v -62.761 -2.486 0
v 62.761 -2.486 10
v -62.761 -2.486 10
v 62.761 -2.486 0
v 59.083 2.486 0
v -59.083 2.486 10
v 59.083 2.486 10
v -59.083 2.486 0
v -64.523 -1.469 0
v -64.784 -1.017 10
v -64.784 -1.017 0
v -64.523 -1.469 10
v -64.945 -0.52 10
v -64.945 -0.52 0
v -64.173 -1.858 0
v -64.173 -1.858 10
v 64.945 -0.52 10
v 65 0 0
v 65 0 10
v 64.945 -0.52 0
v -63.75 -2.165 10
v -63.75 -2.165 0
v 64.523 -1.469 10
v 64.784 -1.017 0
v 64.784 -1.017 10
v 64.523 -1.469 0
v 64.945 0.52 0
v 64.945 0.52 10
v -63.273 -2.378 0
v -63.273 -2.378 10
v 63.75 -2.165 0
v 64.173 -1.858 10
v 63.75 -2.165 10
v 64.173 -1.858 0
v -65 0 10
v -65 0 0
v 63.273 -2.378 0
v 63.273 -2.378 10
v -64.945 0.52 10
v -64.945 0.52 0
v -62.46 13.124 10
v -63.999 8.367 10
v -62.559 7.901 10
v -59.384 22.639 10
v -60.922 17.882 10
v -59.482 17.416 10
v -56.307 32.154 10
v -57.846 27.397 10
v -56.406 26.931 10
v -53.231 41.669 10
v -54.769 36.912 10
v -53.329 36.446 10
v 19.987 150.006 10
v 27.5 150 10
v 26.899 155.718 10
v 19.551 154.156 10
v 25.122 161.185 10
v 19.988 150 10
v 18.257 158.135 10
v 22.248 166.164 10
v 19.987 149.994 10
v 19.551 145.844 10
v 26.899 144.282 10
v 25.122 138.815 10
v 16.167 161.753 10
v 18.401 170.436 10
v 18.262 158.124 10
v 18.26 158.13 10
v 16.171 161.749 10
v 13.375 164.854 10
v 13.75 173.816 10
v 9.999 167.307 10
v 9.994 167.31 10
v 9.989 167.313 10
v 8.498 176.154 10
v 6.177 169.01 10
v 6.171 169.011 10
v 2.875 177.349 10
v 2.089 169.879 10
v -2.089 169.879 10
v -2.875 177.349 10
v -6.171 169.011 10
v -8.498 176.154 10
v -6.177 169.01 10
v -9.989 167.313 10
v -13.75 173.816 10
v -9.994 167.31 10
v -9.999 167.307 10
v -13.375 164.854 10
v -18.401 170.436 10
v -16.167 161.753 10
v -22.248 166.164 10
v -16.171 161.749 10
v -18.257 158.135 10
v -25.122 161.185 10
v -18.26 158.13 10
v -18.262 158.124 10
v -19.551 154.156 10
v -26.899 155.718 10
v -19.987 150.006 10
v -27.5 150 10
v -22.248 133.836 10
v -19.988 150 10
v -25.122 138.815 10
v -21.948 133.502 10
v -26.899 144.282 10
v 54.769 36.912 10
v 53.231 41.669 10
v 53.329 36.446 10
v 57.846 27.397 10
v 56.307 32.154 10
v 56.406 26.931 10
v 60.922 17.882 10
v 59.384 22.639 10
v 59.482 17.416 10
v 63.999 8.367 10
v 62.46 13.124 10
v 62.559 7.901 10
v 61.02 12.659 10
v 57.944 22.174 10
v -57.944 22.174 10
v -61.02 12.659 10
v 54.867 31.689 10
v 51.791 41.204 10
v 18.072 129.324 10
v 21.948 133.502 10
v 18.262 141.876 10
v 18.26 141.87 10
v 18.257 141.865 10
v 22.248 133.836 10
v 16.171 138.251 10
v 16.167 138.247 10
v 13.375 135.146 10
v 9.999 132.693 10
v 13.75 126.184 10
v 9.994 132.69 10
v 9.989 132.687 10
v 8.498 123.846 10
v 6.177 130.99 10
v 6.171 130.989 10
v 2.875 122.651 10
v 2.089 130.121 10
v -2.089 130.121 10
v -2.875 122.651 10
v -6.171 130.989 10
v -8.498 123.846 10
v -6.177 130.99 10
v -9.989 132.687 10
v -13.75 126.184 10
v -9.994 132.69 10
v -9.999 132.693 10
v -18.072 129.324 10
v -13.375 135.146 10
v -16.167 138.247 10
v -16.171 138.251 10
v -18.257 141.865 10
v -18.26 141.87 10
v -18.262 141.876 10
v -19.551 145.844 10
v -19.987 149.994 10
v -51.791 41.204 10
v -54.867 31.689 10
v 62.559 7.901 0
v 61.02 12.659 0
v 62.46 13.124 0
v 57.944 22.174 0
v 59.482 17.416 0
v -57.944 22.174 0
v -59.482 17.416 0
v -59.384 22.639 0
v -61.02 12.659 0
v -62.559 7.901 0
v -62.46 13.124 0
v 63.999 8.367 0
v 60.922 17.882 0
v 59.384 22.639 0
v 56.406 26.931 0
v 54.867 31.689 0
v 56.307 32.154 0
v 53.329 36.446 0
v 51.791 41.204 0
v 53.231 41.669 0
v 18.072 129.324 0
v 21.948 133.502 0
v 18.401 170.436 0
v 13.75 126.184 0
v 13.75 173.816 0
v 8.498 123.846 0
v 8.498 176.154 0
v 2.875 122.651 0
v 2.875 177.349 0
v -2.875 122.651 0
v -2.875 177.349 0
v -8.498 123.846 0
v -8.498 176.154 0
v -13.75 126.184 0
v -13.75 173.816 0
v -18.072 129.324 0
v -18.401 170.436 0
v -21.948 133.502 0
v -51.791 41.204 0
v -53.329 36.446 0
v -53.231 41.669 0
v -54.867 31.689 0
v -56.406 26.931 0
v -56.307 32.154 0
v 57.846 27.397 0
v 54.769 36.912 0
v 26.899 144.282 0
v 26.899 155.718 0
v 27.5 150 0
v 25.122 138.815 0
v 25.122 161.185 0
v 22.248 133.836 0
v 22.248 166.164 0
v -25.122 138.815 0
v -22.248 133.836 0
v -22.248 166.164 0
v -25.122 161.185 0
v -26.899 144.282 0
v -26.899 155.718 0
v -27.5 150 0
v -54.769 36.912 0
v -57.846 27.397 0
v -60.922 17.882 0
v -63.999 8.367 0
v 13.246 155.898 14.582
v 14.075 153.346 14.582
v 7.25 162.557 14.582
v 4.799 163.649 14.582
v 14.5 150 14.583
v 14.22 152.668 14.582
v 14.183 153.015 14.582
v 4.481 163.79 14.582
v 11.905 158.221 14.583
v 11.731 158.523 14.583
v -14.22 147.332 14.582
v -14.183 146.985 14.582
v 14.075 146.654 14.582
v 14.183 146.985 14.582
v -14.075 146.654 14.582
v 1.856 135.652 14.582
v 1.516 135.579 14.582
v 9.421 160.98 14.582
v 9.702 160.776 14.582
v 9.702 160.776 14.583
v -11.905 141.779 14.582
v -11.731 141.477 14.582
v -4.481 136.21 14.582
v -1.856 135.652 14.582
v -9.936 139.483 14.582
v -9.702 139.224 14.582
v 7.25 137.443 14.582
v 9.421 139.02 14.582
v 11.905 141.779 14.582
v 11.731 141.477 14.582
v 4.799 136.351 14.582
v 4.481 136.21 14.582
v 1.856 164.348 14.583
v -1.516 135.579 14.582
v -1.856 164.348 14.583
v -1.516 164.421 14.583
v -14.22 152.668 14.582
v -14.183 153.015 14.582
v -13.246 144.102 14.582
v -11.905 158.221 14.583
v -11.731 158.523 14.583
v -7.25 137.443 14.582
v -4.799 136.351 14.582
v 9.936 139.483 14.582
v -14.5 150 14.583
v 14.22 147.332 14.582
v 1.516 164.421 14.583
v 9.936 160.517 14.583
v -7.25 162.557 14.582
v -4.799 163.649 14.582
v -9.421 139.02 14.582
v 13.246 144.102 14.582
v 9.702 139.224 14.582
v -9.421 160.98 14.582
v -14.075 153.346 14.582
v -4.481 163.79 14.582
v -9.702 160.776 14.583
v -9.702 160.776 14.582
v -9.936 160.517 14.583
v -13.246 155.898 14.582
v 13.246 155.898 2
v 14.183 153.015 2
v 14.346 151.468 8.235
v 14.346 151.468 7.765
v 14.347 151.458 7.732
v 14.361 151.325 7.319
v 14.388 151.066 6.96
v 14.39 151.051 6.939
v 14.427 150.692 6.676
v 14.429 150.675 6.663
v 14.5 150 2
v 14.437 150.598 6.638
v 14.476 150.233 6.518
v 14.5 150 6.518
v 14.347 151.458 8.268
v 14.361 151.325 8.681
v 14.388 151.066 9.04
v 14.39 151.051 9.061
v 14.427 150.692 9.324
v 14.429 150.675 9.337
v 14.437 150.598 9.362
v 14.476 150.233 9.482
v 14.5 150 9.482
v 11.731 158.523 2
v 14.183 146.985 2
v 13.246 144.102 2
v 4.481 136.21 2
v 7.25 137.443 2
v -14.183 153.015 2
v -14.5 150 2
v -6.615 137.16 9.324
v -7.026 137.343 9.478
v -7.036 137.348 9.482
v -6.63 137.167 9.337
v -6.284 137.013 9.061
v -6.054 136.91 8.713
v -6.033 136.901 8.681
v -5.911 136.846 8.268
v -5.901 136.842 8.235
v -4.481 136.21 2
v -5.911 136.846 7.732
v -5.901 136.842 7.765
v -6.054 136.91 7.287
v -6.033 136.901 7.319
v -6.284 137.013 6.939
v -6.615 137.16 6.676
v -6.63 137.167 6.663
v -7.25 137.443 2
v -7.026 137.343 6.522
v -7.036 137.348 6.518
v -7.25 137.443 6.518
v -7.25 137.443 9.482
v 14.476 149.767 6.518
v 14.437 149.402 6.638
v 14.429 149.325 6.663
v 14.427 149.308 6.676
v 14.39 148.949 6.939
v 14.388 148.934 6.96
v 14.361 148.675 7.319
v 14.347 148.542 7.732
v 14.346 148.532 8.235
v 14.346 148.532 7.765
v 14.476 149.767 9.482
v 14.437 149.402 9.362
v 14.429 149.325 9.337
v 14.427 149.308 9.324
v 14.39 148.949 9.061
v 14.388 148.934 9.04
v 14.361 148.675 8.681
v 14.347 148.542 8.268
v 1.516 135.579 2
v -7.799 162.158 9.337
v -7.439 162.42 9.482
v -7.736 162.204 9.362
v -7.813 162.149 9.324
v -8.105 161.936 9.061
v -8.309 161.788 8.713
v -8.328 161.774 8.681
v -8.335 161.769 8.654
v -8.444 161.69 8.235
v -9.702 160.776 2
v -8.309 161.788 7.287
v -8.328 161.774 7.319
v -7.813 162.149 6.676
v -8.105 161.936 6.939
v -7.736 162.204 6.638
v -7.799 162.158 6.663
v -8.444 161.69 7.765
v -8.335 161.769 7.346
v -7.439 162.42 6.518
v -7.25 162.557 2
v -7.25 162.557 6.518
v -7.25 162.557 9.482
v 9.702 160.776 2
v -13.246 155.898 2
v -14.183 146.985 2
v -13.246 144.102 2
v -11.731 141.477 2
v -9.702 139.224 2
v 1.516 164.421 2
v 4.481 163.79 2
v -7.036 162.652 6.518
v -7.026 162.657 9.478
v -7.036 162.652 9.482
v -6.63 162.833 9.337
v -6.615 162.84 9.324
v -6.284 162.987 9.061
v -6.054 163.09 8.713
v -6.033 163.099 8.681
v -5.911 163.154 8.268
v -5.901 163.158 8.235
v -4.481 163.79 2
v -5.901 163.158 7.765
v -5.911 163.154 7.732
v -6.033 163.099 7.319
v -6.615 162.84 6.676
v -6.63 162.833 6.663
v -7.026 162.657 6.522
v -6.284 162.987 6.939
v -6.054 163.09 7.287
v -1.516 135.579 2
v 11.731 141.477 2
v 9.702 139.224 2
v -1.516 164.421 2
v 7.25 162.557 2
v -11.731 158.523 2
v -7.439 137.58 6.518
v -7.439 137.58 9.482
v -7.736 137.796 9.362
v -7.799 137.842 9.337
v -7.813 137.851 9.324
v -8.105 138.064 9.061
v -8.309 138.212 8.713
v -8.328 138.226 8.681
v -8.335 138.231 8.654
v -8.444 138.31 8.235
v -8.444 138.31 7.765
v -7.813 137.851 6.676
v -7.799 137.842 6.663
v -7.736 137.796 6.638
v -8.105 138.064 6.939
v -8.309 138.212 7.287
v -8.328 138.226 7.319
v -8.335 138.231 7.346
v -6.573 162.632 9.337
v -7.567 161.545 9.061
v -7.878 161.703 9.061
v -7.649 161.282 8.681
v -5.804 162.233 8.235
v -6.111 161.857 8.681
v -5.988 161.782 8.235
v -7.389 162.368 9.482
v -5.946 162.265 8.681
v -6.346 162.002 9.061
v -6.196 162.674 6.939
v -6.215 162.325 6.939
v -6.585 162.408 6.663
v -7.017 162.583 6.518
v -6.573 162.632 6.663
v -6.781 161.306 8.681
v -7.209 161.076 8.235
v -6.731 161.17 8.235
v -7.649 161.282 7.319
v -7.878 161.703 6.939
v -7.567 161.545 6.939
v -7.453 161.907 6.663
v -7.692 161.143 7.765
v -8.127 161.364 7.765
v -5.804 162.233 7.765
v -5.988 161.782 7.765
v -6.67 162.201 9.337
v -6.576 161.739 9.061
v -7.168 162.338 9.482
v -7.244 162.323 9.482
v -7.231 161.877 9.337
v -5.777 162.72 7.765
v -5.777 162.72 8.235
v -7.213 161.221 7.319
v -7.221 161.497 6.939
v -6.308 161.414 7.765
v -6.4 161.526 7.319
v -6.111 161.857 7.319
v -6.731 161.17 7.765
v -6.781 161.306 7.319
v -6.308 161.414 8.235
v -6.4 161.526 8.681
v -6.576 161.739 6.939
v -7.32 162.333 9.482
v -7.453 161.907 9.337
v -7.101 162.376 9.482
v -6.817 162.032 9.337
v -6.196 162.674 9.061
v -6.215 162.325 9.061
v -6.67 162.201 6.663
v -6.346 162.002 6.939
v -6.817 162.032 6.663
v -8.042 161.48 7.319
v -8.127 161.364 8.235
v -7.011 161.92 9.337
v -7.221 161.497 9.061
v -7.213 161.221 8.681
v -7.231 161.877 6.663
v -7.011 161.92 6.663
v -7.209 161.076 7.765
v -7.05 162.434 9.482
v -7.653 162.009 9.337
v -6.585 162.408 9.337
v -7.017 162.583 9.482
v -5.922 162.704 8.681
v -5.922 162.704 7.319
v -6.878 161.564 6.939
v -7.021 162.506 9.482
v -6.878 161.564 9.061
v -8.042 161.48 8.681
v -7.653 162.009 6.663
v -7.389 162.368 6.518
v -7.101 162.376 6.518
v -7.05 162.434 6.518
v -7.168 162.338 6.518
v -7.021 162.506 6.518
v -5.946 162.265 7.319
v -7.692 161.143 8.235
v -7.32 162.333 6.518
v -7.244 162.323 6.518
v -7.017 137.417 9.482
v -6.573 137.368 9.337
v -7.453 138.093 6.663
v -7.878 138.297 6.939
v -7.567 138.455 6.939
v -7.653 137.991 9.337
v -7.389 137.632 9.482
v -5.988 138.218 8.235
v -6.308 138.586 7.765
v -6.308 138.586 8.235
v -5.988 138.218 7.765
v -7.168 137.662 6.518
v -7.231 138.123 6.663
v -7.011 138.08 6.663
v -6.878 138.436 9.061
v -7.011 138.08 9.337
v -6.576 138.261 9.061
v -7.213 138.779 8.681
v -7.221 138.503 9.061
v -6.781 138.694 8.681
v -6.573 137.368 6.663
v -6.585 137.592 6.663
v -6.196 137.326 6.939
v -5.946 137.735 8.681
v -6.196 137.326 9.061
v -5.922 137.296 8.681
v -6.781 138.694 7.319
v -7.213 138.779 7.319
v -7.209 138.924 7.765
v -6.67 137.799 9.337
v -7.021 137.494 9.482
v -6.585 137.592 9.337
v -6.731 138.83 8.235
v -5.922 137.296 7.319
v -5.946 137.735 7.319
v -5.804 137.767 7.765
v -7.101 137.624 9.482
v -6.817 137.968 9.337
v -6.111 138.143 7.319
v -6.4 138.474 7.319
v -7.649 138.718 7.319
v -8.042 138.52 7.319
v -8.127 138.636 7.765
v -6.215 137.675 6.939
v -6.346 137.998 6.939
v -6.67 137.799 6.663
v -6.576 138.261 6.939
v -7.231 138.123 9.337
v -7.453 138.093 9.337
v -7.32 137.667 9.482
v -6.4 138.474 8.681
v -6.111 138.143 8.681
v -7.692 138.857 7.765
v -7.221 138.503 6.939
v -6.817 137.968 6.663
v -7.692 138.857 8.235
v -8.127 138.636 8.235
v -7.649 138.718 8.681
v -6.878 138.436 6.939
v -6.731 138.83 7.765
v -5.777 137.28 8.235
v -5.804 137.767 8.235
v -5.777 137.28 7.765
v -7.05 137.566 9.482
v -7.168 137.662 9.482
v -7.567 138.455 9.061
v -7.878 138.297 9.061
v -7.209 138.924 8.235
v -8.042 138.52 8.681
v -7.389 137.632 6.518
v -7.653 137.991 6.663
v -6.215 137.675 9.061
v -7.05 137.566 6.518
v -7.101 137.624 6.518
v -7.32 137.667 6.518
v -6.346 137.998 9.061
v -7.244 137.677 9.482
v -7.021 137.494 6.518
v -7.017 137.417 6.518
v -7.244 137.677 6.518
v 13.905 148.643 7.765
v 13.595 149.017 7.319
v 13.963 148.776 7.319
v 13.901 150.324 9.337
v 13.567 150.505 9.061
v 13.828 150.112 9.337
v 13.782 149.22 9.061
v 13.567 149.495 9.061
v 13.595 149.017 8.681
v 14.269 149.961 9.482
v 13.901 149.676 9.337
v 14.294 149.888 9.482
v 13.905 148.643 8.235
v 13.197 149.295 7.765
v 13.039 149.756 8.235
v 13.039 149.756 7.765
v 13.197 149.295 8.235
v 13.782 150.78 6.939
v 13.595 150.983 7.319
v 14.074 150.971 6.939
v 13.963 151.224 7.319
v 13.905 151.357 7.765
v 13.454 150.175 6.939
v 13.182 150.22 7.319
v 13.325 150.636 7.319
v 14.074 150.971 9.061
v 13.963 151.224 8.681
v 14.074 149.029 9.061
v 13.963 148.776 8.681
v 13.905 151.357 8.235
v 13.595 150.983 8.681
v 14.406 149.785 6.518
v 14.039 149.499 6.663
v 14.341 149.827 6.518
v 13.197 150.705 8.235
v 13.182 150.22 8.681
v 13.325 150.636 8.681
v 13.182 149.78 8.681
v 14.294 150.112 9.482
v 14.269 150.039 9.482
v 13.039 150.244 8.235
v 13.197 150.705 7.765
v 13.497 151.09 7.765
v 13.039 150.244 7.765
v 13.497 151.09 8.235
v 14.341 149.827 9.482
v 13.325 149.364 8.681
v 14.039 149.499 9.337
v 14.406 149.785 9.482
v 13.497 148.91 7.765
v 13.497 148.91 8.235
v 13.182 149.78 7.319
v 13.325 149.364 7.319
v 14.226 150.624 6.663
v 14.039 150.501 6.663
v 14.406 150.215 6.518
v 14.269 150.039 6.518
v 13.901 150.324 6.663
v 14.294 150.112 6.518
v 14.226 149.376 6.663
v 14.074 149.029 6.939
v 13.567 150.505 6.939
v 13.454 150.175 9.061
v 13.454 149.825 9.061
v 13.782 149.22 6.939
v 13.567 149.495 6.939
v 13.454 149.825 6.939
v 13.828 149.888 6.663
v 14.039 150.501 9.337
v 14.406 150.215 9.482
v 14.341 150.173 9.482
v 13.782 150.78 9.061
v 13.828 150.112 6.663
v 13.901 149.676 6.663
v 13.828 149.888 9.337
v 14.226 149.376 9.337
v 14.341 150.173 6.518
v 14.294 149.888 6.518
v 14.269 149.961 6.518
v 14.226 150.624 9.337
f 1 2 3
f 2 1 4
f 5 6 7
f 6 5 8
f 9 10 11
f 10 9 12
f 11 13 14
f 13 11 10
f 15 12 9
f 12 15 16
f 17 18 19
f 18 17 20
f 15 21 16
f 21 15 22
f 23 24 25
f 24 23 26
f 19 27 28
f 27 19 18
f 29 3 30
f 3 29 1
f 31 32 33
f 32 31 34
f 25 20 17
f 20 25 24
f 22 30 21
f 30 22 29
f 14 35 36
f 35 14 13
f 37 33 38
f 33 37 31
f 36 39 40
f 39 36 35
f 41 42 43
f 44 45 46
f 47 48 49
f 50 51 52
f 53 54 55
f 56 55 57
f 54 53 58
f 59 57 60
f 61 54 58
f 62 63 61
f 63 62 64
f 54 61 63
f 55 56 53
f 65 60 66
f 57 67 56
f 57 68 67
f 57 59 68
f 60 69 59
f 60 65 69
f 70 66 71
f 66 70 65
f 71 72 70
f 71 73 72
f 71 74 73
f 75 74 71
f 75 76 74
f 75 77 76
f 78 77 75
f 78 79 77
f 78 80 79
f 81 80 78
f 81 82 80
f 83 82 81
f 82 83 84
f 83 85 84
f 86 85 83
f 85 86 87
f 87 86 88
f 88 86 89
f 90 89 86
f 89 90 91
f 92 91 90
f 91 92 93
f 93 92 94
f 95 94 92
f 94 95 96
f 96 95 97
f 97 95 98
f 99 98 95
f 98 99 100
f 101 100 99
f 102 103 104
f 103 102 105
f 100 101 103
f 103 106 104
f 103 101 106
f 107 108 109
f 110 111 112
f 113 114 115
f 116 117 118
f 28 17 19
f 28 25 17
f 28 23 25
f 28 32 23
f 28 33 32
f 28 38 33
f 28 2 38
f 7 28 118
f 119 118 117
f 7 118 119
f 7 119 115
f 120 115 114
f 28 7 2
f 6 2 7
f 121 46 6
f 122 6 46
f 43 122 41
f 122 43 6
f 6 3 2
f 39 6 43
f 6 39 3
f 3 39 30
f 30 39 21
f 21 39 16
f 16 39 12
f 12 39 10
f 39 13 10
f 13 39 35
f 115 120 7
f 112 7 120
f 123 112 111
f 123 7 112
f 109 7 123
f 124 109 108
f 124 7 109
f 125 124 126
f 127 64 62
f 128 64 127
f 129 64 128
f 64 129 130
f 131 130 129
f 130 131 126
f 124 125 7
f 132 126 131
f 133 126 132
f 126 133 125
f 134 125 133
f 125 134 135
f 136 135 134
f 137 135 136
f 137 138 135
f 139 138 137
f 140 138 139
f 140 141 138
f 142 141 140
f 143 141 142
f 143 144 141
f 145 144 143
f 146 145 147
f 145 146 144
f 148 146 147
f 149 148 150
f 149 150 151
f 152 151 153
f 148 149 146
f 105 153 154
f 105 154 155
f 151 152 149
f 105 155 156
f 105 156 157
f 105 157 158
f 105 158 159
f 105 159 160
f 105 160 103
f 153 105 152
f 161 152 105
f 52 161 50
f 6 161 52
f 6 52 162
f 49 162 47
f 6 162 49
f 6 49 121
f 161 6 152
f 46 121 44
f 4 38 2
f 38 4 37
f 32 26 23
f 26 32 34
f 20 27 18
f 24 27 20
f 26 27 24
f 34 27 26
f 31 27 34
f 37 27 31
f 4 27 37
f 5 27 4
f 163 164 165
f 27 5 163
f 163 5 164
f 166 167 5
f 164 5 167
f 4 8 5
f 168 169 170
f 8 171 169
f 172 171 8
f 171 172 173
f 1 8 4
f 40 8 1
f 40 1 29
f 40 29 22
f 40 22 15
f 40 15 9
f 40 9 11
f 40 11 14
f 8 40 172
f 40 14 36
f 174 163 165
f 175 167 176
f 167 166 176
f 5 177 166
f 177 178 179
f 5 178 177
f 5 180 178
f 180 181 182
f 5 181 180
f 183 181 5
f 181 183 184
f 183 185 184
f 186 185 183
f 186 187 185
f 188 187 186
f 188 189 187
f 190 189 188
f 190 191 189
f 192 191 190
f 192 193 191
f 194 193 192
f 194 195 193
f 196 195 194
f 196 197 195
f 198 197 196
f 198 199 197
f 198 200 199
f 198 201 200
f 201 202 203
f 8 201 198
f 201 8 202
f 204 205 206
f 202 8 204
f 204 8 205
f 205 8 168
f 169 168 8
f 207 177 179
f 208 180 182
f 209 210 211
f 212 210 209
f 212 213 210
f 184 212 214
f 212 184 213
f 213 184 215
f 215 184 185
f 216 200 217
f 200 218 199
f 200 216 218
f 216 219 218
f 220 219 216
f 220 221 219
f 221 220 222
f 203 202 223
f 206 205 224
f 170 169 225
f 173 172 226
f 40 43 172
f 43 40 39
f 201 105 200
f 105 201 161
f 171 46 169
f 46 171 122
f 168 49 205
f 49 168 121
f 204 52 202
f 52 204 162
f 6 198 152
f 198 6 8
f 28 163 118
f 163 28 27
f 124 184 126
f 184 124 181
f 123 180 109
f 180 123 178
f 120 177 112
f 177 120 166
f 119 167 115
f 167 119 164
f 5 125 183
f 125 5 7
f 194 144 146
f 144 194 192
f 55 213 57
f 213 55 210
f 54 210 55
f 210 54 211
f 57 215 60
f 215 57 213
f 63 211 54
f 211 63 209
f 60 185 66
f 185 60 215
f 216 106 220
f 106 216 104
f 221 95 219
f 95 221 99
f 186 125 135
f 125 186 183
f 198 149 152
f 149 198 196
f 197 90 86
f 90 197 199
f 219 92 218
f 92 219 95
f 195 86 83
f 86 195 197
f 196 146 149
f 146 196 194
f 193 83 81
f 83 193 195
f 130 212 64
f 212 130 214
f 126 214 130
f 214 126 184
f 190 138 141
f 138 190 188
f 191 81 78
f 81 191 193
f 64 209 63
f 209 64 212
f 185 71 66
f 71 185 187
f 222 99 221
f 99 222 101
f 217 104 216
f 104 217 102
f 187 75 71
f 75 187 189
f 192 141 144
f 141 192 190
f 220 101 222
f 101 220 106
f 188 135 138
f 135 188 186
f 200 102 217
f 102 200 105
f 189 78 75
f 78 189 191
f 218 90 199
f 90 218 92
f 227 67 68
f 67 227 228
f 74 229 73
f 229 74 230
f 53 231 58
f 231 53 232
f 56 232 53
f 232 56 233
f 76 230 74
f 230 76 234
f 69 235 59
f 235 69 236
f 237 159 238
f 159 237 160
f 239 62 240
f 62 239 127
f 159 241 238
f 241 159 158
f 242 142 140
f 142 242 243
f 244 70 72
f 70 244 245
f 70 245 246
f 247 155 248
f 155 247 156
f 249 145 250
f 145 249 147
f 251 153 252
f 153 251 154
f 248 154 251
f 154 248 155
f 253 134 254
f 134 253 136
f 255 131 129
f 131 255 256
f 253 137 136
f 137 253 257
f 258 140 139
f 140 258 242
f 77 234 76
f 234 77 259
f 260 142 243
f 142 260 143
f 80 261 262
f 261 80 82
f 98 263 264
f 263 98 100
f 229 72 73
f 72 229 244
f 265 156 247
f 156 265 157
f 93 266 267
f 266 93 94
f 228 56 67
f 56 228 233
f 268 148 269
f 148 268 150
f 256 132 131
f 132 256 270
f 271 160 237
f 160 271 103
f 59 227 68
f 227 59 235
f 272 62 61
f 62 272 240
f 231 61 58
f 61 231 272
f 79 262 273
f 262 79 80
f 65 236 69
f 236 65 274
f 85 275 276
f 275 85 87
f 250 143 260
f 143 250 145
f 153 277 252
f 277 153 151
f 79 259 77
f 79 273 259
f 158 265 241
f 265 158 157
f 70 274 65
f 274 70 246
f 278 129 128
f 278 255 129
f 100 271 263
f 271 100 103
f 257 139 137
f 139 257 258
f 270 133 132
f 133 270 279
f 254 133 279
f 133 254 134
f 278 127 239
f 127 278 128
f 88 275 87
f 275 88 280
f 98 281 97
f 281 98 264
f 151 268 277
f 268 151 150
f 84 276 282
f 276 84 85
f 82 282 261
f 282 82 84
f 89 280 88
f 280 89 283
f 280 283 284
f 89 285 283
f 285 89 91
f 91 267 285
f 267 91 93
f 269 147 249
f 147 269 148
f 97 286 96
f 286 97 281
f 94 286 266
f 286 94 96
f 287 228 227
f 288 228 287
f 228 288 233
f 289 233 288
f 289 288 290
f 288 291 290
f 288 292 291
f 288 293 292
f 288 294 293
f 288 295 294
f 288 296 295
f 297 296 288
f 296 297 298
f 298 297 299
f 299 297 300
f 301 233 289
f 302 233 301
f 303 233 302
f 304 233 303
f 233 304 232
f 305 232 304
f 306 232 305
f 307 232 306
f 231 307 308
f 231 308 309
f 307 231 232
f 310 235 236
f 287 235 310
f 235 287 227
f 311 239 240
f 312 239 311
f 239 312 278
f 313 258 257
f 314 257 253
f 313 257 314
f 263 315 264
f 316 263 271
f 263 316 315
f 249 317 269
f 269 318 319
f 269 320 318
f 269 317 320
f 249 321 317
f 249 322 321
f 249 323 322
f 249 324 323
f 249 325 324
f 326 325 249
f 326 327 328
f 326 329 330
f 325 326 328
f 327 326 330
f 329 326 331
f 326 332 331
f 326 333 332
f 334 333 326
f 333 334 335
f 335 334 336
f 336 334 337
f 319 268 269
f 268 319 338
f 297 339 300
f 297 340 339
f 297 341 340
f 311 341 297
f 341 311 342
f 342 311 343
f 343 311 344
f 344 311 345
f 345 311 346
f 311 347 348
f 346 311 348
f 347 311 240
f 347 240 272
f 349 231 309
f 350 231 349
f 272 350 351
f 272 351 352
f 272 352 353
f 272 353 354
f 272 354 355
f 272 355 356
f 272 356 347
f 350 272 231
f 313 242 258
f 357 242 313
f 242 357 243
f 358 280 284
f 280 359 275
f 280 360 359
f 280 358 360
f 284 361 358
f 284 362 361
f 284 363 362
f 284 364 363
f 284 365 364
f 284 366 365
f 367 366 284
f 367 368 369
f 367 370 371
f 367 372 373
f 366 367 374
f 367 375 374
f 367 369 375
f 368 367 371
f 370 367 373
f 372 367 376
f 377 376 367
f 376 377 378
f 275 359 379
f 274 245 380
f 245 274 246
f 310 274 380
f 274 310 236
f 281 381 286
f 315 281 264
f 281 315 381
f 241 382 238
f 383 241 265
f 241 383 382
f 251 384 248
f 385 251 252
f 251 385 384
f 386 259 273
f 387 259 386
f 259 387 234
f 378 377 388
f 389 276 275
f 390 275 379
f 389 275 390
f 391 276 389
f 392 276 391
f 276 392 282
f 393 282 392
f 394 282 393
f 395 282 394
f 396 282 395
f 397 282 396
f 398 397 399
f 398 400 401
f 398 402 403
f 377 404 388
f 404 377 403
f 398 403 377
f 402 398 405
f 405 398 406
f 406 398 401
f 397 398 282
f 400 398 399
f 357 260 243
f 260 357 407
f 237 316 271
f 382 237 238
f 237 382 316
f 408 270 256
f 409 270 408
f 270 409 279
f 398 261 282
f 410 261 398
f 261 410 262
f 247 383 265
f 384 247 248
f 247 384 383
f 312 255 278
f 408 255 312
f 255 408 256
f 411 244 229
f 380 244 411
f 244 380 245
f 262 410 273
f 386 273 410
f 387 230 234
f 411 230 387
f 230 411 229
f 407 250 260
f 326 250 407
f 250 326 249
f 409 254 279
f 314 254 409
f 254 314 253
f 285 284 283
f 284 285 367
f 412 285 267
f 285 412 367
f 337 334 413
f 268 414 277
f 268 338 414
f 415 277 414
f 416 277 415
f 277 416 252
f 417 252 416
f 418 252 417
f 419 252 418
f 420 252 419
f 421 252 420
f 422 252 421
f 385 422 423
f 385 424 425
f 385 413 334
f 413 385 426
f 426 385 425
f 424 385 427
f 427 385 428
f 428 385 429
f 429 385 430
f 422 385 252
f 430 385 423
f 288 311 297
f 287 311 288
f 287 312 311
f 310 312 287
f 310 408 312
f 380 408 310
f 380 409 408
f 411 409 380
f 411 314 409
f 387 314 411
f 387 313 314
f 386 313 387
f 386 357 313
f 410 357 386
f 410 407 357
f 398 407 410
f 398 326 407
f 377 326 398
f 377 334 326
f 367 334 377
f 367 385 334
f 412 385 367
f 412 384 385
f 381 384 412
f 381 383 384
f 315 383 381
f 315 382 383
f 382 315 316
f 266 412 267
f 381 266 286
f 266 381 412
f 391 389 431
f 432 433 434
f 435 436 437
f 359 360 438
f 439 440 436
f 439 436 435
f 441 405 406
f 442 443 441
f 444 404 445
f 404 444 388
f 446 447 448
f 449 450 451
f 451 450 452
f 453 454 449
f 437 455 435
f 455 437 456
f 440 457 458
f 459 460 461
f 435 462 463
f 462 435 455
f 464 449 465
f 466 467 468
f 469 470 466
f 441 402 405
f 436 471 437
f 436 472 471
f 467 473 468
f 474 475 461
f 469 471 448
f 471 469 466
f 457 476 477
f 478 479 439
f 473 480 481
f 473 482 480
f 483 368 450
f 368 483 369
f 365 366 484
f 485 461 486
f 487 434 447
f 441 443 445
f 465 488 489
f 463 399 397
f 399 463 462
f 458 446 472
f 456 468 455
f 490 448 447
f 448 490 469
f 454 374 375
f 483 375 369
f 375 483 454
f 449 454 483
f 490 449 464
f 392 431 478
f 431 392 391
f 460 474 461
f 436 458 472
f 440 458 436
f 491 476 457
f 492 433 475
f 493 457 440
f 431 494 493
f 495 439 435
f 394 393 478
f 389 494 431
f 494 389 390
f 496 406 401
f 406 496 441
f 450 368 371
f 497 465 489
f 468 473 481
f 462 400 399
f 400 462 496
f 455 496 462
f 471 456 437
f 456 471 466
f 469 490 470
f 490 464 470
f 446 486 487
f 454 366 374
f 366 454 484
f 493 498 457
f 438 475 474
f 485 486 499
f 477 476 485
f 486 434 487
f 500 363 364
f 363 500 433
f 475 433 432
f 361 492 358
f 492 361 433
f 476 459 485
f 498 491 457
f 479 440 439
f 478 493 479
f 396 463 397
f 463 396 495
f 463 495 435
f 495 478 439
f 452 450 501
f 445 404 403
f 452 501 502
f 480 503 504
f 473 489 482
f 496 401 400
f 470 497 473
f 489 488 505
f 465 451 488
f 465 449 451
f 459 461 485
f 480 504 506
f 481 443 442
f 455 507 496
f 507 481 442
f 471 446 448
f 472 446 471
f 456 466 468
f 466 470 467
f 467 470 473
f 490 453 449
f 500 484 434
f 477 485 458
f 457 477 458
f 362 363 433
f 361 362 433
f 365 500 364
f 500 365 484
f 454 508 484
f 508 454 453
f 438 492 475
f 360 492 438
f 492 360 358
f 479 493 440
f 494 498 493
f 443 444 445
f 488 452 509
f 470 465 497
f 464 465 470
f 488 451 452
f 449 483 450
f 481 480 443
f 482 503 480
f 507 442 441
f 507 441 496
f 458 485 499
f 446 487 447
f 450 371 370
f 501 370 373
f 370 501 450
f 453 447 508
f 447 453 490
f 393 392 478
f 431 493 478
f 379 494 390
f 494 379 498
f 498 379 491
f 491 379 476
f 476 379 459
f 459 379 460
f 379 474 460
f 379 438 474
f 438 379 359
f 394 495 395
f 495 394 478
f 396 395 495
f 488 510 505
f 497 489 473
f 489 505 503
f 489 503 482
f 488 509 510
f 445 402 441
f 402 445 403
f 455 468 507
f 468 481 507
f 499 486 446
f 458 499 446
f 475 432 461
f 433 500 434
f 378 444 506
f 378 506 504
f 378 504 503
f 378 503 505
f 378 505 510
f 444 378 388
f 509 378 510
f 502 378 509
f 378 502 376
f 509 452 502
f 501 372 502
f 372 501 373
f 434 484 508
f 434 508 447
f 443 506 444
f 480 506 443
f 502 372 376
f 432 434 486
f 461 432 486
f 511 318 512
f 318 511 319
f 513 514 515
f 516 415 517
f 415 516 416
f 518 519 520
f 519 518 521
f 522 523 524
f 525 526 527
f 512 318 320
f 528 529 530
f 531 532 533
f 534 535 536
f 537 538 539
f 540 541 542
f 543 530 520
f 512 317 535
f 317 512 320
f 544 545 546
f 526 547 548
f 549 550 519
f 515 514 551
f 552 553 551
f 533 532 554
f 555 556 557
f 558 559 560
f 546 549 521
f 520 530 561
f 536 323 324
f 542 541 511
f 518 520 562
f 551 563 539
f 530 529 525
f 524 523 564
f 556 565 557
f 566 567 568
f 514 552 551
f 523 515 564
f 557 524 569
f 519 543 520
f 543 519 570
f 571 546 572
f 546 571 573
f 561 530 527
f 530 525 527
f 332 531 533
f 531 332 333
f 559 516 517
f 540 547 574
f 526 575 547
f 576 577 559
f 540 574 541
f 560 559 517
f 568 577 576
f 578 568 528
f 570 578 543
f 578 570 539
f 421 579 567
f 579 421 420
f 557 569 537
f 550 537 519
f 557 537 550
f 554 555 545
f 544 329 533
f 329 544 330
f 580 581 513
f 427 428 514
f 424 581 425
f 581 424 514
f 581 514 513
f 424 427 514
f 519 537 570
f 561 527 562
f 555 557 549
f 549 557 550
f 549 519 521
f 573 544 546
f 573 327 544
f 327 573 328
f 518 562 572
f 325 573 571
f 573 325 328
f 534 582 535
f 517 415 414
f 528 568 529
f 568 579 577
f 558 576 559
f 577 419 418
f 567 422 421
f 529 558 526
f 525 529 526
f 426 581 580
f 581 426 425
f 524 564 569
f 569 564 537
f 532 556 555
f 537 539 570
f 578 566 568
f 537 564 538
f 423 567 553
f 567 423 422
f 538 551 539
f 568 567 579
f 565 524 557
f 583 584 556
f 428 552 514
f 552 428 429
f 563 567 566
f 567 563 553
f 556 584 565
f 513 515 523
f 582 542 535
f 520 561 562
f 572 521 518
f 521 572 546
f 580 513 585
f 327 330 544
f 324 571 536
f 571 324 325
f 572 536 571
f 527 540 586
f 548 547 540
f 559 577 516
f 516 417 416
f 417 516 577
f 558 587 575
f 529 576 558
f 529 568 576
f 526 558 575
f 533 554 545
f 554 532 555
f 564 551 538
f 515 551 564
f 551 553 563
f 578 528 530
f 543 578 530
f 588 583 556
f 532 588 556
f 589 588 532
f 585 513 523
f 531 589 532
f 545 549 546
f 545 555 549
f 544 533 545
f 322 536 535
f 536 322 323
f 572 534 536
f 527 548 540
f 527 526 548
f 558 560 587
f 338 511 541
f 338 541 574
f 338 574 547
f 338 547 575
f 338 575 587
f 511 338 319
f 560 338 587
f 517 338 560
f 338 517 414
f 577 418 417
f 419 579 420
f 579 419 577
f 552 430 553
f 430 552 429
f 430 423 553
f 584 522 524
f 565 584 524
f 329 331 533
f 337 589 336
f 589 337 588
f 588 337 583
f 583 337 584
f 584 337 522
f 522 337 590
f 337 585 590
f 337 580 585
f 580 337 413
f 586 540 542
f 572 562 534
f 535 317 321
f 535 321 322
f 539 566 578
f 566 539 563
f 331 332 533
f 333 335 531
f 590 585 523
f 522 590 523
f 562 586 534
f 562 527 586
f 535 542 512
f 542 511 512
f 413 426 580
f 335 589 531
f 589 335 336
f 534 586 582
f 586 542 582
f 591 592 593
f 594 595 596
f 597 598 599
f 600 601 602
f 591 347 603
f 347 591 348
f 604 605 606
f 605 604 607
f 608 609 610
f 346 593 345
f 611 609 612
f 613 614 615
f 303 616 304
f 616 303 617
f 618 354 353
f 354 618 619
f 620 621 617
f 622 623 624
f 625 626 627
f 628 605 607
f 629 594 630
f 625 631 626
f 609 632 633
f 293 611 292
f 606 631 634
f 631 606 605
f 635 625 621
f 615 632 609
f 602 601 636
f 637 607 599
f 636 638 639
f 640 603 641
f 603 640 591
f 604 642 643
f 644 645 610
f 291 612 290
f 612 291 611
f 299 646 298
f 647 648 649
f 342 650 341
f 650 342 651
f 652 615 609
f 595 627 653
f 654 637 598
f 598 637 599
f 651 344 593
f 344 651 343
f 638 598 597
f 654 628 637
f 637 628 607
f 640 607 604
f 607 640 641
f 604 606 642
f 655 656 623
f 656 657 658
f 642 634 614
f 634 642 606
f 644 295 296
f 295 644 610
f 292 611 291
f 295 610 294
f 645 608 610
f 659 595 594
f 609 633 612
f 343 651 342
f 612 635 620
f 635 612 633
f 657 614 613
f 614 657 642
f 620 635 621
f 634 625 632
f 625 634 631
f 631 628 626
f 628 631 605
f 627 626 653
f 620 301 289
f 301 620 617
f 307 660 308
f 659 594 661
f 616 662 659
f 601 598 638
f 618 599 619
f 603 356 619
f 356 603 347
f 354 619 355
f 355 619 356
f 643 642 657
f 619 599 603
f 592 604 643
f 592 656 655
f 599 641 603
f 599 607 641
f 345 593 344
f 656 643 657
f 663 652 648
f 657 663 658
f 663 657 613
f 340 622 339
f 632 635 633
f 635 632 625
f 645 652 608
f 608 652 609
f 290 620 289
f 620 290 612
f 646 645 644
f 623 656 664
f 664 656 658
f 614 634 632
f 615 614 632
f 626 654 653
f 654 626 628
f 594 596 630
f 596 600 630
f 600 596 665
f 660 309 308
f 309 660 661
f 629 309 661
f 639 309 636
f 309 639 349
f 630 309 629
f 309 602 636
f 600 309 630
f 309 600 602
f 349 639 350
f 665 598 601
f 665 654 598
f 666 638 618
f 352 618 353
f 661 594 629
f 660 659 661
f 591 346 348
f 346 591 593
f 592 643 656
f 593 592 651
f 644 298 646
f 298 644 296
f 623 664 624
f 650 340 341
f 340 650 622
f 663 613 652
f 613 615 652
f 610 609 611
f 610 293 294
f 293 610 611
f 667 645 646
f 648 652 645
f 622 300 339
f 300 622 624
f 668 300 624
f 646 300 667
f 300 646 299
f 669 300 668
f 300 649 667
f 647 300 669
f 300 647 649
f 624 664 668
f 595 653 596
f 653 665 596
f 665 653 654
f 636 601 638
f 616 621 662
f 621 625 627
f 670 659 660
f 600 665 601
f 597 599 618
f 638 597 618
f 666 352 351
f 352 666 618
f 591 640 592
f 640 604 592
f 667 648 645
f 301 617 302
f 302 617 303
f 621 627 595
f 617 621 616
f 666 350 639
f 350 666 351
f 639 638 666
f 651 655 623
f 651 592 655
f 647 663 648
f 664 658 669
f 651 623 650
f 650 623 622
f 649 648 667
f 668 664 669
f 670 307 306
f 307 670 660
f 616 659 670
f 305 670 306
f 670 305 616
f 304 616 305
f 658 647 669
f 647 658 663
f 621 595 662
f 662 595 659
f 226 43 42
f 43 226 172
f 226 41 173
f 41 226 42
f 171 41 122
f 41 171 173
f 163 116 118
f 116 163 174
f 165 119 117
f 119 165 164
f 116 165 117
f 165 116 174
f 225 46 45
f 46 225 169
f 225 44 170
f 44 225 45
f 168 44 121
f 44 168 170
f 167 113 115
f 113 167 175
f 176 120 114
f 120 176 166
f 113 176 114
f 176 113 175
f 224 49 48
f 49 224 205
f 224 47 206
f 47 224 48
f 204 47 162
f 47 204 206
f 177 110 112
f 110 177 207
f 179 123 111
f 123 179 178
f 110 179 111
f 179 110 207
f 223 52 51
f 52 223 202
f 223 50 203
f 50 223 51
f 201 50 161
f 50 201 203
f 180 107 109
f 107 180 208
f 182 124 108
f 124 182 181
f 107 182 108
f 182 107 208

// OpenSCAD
// ZipSpool - Filament spool holder for printing from a sealed bag
//
// Copyright (C) 2019-2020  Kevin O'Connor <kevin@koconnor.net>
//
// This file may be distributed under the terms of the GNU GPLv3 license.

holder_height = 180;
holder_width = 125;
holder_arm_depth = 10;
holder_arm_height = 5;
holder_spindle_backing = 55;
holder_spindle_offset = 3;
holder_key_angle_offset = 30;
holder_bevel_diameter = 40;
holder_bevel_depth = 5;
holder_clip_height = 5;
holder_clip_width = 2;
holder_clip_offset = 10;
spindle_diameter = 28;
spindle_thickness = 2.5;
spindle_key_diameter = 3;
spindle_key_offset = 5;
spindle_key_angles = [90, 210, 330];
spindle_spool_length = 71;
ptfe_tube_diameter = 4;
clip_beam_width = 10;
clip_beam_height = 5;
slack = 1;
CUT = 0.01;
$fs = 0.5;

//
// Holder
//

module key(angle, diameter) {
    rotate(angle, [0, 0, 1])
        translate([diameter/2, 0, 0])
            sphere(d=spindle_key_diameter);
}

module holder() {
    // Start with triangle "arms" forming the base
    backing_center_y = (holder_height - holder_spindle_backing/2
                        - holder_arm_height/2);
    module arms() {
        module base_cylinder(pos) {
            translate(pos)
                cylinder(h=holder_arm_depth, d=holder_arm_height);
        }
        bot1 = [-holder_width/2, 0];
        bot2 = [holder_width/2, 0];
        top1 = [-spindle_diameter/2, backing_center_y];
        top2 = [spindle_diameter/2, backing_center_y];
        union() {
            hull() {
                base_cylinder(bot1);
                base_cylinder(bot2);
            }
            hull() {
                base_cylinder(bot1);
                base_cylinder(top1);
            }
            hull() {
                base_cylinder(bot2);
                base_cylinder(top2);
            }
        }
    }
    // Add in the spindle backing
    module arms_with_backing() {
        arms();
        translate([0, backing_center_y]) {
            cylinder(h=holder_arm_depth, d=holder_spindle_backing);
            translate([0, 0, holder_arm_depth-CUT])
                cylinder(h=holder_bevel_depth+CUT,
                    d1=holder_bevel_diameter, d2=spindle_diameter);
        }
    }
    // Subtract out space for the spindle
    cut_diameter = spindle_diameter + slack;
    difference() {
        arms_with_backing();
        translate([0, backing_center_y, holder_spindle_offset - slack])
            cylinder(h=holder_arm_depth+holder_bevel_depth, d=cut_diameter);
    }
    // Add in key protrusions on the spindle holder
    translate([0, backing_center_y, holder_spindle_offset+spindle_key_offset]) {
        for (angle=spindle_key_angles)
            key(angle + holder_key_angle_offset, cut_diameter);
    }
    // Add clip holders to the base
    angle = atan(backing_center_y / ((holder_width-spindle_diameter)/2));
    module clip(dir, offset) {
        translate([-dir * holder_width/2, 0, 0])
            rotate(dir * angle, [0, 0, 1])
               translate([dir * offset, holder_clip_width,
                          holder_arm_depth/2])
                  cube(size=[holder_clip_height,
                             2*holder_clip_width,
                             holder_arm_depth], center=true);
    }
    for (clip_num=[1, 2, 3, 4]) {
        clip(1, clip_num * holder_clip_offset);
        clip(-1, clip_num * holder_clip_offset);
    }
}

//
// Spindle
//

module spindle() {
    module key_channels(chan_height) {
        // Horizontal channels
        translate([0, 0, chan_height]) {
            angle_swing = holder_key_angle_offset * 2.5;
            for (angle=spindle_key_angles) {
                rotate(a=angle - angle_swing/2, v=[0, 0, 1])
                    rotate_extrude(angle=angle_swing)
                        translate([spindle_diameter/2, 0, 0])
                            circle(d=spindle_key_diameter);
            }
        }
    }
    enclosed_len = holder_bevel_depth+holder_arm_depth - holder_spindle_offset;
    total_height=spindle_spool_length + 2*enclosed_len;
    cyl_sides = 100;
    module core_spindle(dia) {
        cylinder(h=total_height, d=dia, $fn=cyl_sides);
        bearing_bump = 2;
        step = 15;
        total = 2*360;
        step_height = spindle_spool_length / total;
        for (i=[0:step:total - step]) {
            bb = bearing_bump * (1 - cos(i));
            bb_next = bearing_bump * (1 - cos(i+step));
            translate([0, 0, enclosed_len + i * step_height])
                cylinder(h=step_height*step+CUT, d1=dia+bb, d2=dia+bb_next,
                         $fn=cyl_sides);
        }
    }
    difference() {
        // Main spindle
        core_spindle(spindle_diameter);
        core_spindle(spindle_diameter - 2*spindle_thickness);
        translate([0, 0, -CUT])
            cylinder(h=total_height + 2*CUT,
                     d=spindle_diameter - 2*spindle_thickness);
        // Horizontal channels
        spindle_key2_offset = total_height - spindle_key_offset;
        key_channels(spindle_key_offset);
        key_channels(spindle_key2_offset);
        // Vertical channels
        for (angle=spindle_key_angles)
            rotate(angle, [0, 0, 1]) {
                translate([spindle_diameter/2, 0, -CUT])
                    cylinder(h=spindle_key_offset+CUT, d=spindle_key_diameter);
                translate([spindle_diameter/2, 0, spindle_key2_offset])
                    cylinder(h=spindle_key_offset+CUT, d=spindle_key_diameter);
            }
    }
}

//
// Holder clip and filament carriage platform
//

module base_clip() {
    clip_z = 10;
    clip_width = holder_arm_depth + slack/2;
    side_extra = 3;
    clip_total_width = clip_width+side_extra+5;
    base_width = spindle_spool_length+2*(holder_bevel_depth + holder_arm_depth);
    total_width = base_width + 2*side_extra;
    holder_angle = 30;
    angle_z_offset = 1.5;
    angle_y_offset = 1.5;
    module rounded_cube(x, y, z) {
        edge_radius = 2;
        hull() {
            translate([edge_radius, edge_radius, 0])
                cylinder(h=z, r=edge_radius);
            translate([edge_radius, y-edge_radius, 0])
                cylinder(h=z, r=edge_radius);
            translate([x-edge_radius, edge_radius, 0])
                cylinder(h=z, r=edge_radius);
            translate([x-edge_radius, y-edge_radius, 0])
                cylinder(h=z, r=edge_radius);
        }
    }
    module inverse_arm() {
        z = (clip_z-holder_clip_height-slack)/2 - angle_z_offset;
        inset = 1;
        module arm() {
            translate([side_extra, holder_clip_width+inset, -19])
                cube([clip_width, 19, z+2*19]);
            translate([side_extra, inset, z])
                cube([clip_width, holder_clip_width+CUT,
                      holder_clip_height+slack]);
        }
        difference() {
            arm();
            notch_dia = 2;
            notch_y = (holder_arm_height + slack + notch_dia/2
                       + holder_clip_width+inset);
            translate([side_extra, notch_y, z + notch_dia/2 + .5])
                sphere(d=notch_dia);
            second_z = z + holder_clip_height+slack - notch_dia/2 - .5;
            translate([side_extra, notch_y, second_z])
                sphere(d=notch_dia);
        }
    }
    module grips_and_beam() {
        rounded_cube(total_width, clip_beam_width, clip_beam_height);
        clip_y = clip_beam_width + slack;
        module grip()
            rounded_cube(clip_total_width, clip_y, clip_z - angle_z_offset);
        translate([0, angle_y_offset, 0])
            rotate([holder_angle, 0, 0]) {
                grip();
                translate([total_width, 0, 0])
                    mirror([1, 0, 0])
                        grip();
            }
    }
    module main_platform() {
        difference() {
            grips_and_beam();
            translate([0, angle_y_offset, 0])
                rotate([holder_angle, 0, 0]) {
                    inverse_arm();
                    translate([total_width, 0, 0])
                        mirror([1, 0, 0])
                            inverse_arm();
                }
        }
    }
    intersection() {
        main_platform();
        translate([0, -19, 0])
            rounded_cube(total_width, clip_beam_width+19, 19);
    }
}

//
// Filament tube carriage
//

module carriage() {
    side_thick = 3;
    guide_rad = 1;
    barrier_thick = 1;
    insert_thick = 11;
    carriage_space_x = clip_beam_width + slack + 2*guide_rad;
    total_x = carriage_space_x + 2*side_thick + barrier_thick + insert_thick;
    outer_dia = ptfe_tube_diameter + 5;
    carriage_space_y = clip_beam_height + slack + guide_rad;
    tube_center_y = side_thick + carriage_space_y + ptfe_tube_diameter/2;
    tube_center_z = outer_dia / 2;
    total_y = tube_center_y + outer_dia/2;

    module base() {
        hull() {
            cube([carriage_space_x + 2*side_thick, tube_center_y, outer_dia]);
            translate([0, tube_center_y, tube_center_z])
                rotate([0, 90, 0])
                    cylinder(h=total_x, d=outer_dia);
        }
    }
    module filament_tube() {
        filament_only_dia = ptfe_tube_diameter - .75;
        tube_guide_dia = ptfe_tube_diameter + slack / 2;
        // Main channel
        cylinder(h=total_x + 2*CUT, d=filament_only_dia);
        l1 = carriage_space_x + 2*side_thick + 2 + CUT;
        cylinder(h=l1, d=tube_guide_dia);
        translate([0, 0, l1 + barrier_thick])
            cylinder(h=insert_thick+CUT, d=tube_guide_dia);
    }

    difference() {
        base();
        // cutout for carriage
        translate([side_thick, side_thick, -CUT])
            cube([carriage_space_x, total_y, outer_dia+2*CUT]);
        // cutout for tube
        translate([-CUT, tube_center_y, tube_center_z])
            rotate([0, 90, 0])
                filament_tube();
    }
    // Add in guide protrusions
    p_x1 = side_thick;
    p_x2 = side_thick + carriage_space_x;
    p_x3 = side_thick + 3;
    p_x4 = side_thick + carriage_space_x - 3;
    p_y1 = side_thick + clip_beam_height/2 + guide_rad;
    p_y2 = side_thick;
    p_z1 = 2;
    p_z2 = outer_dia - 2;
    protrusions = [
        [p_x1, p_y1, p_z1], [p_x2, p_y1, p_z1],
        [p_x1, p_y1, p_z2], [p_x2, p_y1, p_z2],
        [p_x3, p_y2, p_z1], [p_x4, p_y2, p_z1],
        [p_x3, p_y2, p_z2], [p_x4, p_y2, p_z2],
    ];
    for (pos=protrusions)
        translate(pos)
            sphere(r=guide_rad);
}

//
// Object selection
//

holder();
//spindle();
//base_clip();
//carriage();
